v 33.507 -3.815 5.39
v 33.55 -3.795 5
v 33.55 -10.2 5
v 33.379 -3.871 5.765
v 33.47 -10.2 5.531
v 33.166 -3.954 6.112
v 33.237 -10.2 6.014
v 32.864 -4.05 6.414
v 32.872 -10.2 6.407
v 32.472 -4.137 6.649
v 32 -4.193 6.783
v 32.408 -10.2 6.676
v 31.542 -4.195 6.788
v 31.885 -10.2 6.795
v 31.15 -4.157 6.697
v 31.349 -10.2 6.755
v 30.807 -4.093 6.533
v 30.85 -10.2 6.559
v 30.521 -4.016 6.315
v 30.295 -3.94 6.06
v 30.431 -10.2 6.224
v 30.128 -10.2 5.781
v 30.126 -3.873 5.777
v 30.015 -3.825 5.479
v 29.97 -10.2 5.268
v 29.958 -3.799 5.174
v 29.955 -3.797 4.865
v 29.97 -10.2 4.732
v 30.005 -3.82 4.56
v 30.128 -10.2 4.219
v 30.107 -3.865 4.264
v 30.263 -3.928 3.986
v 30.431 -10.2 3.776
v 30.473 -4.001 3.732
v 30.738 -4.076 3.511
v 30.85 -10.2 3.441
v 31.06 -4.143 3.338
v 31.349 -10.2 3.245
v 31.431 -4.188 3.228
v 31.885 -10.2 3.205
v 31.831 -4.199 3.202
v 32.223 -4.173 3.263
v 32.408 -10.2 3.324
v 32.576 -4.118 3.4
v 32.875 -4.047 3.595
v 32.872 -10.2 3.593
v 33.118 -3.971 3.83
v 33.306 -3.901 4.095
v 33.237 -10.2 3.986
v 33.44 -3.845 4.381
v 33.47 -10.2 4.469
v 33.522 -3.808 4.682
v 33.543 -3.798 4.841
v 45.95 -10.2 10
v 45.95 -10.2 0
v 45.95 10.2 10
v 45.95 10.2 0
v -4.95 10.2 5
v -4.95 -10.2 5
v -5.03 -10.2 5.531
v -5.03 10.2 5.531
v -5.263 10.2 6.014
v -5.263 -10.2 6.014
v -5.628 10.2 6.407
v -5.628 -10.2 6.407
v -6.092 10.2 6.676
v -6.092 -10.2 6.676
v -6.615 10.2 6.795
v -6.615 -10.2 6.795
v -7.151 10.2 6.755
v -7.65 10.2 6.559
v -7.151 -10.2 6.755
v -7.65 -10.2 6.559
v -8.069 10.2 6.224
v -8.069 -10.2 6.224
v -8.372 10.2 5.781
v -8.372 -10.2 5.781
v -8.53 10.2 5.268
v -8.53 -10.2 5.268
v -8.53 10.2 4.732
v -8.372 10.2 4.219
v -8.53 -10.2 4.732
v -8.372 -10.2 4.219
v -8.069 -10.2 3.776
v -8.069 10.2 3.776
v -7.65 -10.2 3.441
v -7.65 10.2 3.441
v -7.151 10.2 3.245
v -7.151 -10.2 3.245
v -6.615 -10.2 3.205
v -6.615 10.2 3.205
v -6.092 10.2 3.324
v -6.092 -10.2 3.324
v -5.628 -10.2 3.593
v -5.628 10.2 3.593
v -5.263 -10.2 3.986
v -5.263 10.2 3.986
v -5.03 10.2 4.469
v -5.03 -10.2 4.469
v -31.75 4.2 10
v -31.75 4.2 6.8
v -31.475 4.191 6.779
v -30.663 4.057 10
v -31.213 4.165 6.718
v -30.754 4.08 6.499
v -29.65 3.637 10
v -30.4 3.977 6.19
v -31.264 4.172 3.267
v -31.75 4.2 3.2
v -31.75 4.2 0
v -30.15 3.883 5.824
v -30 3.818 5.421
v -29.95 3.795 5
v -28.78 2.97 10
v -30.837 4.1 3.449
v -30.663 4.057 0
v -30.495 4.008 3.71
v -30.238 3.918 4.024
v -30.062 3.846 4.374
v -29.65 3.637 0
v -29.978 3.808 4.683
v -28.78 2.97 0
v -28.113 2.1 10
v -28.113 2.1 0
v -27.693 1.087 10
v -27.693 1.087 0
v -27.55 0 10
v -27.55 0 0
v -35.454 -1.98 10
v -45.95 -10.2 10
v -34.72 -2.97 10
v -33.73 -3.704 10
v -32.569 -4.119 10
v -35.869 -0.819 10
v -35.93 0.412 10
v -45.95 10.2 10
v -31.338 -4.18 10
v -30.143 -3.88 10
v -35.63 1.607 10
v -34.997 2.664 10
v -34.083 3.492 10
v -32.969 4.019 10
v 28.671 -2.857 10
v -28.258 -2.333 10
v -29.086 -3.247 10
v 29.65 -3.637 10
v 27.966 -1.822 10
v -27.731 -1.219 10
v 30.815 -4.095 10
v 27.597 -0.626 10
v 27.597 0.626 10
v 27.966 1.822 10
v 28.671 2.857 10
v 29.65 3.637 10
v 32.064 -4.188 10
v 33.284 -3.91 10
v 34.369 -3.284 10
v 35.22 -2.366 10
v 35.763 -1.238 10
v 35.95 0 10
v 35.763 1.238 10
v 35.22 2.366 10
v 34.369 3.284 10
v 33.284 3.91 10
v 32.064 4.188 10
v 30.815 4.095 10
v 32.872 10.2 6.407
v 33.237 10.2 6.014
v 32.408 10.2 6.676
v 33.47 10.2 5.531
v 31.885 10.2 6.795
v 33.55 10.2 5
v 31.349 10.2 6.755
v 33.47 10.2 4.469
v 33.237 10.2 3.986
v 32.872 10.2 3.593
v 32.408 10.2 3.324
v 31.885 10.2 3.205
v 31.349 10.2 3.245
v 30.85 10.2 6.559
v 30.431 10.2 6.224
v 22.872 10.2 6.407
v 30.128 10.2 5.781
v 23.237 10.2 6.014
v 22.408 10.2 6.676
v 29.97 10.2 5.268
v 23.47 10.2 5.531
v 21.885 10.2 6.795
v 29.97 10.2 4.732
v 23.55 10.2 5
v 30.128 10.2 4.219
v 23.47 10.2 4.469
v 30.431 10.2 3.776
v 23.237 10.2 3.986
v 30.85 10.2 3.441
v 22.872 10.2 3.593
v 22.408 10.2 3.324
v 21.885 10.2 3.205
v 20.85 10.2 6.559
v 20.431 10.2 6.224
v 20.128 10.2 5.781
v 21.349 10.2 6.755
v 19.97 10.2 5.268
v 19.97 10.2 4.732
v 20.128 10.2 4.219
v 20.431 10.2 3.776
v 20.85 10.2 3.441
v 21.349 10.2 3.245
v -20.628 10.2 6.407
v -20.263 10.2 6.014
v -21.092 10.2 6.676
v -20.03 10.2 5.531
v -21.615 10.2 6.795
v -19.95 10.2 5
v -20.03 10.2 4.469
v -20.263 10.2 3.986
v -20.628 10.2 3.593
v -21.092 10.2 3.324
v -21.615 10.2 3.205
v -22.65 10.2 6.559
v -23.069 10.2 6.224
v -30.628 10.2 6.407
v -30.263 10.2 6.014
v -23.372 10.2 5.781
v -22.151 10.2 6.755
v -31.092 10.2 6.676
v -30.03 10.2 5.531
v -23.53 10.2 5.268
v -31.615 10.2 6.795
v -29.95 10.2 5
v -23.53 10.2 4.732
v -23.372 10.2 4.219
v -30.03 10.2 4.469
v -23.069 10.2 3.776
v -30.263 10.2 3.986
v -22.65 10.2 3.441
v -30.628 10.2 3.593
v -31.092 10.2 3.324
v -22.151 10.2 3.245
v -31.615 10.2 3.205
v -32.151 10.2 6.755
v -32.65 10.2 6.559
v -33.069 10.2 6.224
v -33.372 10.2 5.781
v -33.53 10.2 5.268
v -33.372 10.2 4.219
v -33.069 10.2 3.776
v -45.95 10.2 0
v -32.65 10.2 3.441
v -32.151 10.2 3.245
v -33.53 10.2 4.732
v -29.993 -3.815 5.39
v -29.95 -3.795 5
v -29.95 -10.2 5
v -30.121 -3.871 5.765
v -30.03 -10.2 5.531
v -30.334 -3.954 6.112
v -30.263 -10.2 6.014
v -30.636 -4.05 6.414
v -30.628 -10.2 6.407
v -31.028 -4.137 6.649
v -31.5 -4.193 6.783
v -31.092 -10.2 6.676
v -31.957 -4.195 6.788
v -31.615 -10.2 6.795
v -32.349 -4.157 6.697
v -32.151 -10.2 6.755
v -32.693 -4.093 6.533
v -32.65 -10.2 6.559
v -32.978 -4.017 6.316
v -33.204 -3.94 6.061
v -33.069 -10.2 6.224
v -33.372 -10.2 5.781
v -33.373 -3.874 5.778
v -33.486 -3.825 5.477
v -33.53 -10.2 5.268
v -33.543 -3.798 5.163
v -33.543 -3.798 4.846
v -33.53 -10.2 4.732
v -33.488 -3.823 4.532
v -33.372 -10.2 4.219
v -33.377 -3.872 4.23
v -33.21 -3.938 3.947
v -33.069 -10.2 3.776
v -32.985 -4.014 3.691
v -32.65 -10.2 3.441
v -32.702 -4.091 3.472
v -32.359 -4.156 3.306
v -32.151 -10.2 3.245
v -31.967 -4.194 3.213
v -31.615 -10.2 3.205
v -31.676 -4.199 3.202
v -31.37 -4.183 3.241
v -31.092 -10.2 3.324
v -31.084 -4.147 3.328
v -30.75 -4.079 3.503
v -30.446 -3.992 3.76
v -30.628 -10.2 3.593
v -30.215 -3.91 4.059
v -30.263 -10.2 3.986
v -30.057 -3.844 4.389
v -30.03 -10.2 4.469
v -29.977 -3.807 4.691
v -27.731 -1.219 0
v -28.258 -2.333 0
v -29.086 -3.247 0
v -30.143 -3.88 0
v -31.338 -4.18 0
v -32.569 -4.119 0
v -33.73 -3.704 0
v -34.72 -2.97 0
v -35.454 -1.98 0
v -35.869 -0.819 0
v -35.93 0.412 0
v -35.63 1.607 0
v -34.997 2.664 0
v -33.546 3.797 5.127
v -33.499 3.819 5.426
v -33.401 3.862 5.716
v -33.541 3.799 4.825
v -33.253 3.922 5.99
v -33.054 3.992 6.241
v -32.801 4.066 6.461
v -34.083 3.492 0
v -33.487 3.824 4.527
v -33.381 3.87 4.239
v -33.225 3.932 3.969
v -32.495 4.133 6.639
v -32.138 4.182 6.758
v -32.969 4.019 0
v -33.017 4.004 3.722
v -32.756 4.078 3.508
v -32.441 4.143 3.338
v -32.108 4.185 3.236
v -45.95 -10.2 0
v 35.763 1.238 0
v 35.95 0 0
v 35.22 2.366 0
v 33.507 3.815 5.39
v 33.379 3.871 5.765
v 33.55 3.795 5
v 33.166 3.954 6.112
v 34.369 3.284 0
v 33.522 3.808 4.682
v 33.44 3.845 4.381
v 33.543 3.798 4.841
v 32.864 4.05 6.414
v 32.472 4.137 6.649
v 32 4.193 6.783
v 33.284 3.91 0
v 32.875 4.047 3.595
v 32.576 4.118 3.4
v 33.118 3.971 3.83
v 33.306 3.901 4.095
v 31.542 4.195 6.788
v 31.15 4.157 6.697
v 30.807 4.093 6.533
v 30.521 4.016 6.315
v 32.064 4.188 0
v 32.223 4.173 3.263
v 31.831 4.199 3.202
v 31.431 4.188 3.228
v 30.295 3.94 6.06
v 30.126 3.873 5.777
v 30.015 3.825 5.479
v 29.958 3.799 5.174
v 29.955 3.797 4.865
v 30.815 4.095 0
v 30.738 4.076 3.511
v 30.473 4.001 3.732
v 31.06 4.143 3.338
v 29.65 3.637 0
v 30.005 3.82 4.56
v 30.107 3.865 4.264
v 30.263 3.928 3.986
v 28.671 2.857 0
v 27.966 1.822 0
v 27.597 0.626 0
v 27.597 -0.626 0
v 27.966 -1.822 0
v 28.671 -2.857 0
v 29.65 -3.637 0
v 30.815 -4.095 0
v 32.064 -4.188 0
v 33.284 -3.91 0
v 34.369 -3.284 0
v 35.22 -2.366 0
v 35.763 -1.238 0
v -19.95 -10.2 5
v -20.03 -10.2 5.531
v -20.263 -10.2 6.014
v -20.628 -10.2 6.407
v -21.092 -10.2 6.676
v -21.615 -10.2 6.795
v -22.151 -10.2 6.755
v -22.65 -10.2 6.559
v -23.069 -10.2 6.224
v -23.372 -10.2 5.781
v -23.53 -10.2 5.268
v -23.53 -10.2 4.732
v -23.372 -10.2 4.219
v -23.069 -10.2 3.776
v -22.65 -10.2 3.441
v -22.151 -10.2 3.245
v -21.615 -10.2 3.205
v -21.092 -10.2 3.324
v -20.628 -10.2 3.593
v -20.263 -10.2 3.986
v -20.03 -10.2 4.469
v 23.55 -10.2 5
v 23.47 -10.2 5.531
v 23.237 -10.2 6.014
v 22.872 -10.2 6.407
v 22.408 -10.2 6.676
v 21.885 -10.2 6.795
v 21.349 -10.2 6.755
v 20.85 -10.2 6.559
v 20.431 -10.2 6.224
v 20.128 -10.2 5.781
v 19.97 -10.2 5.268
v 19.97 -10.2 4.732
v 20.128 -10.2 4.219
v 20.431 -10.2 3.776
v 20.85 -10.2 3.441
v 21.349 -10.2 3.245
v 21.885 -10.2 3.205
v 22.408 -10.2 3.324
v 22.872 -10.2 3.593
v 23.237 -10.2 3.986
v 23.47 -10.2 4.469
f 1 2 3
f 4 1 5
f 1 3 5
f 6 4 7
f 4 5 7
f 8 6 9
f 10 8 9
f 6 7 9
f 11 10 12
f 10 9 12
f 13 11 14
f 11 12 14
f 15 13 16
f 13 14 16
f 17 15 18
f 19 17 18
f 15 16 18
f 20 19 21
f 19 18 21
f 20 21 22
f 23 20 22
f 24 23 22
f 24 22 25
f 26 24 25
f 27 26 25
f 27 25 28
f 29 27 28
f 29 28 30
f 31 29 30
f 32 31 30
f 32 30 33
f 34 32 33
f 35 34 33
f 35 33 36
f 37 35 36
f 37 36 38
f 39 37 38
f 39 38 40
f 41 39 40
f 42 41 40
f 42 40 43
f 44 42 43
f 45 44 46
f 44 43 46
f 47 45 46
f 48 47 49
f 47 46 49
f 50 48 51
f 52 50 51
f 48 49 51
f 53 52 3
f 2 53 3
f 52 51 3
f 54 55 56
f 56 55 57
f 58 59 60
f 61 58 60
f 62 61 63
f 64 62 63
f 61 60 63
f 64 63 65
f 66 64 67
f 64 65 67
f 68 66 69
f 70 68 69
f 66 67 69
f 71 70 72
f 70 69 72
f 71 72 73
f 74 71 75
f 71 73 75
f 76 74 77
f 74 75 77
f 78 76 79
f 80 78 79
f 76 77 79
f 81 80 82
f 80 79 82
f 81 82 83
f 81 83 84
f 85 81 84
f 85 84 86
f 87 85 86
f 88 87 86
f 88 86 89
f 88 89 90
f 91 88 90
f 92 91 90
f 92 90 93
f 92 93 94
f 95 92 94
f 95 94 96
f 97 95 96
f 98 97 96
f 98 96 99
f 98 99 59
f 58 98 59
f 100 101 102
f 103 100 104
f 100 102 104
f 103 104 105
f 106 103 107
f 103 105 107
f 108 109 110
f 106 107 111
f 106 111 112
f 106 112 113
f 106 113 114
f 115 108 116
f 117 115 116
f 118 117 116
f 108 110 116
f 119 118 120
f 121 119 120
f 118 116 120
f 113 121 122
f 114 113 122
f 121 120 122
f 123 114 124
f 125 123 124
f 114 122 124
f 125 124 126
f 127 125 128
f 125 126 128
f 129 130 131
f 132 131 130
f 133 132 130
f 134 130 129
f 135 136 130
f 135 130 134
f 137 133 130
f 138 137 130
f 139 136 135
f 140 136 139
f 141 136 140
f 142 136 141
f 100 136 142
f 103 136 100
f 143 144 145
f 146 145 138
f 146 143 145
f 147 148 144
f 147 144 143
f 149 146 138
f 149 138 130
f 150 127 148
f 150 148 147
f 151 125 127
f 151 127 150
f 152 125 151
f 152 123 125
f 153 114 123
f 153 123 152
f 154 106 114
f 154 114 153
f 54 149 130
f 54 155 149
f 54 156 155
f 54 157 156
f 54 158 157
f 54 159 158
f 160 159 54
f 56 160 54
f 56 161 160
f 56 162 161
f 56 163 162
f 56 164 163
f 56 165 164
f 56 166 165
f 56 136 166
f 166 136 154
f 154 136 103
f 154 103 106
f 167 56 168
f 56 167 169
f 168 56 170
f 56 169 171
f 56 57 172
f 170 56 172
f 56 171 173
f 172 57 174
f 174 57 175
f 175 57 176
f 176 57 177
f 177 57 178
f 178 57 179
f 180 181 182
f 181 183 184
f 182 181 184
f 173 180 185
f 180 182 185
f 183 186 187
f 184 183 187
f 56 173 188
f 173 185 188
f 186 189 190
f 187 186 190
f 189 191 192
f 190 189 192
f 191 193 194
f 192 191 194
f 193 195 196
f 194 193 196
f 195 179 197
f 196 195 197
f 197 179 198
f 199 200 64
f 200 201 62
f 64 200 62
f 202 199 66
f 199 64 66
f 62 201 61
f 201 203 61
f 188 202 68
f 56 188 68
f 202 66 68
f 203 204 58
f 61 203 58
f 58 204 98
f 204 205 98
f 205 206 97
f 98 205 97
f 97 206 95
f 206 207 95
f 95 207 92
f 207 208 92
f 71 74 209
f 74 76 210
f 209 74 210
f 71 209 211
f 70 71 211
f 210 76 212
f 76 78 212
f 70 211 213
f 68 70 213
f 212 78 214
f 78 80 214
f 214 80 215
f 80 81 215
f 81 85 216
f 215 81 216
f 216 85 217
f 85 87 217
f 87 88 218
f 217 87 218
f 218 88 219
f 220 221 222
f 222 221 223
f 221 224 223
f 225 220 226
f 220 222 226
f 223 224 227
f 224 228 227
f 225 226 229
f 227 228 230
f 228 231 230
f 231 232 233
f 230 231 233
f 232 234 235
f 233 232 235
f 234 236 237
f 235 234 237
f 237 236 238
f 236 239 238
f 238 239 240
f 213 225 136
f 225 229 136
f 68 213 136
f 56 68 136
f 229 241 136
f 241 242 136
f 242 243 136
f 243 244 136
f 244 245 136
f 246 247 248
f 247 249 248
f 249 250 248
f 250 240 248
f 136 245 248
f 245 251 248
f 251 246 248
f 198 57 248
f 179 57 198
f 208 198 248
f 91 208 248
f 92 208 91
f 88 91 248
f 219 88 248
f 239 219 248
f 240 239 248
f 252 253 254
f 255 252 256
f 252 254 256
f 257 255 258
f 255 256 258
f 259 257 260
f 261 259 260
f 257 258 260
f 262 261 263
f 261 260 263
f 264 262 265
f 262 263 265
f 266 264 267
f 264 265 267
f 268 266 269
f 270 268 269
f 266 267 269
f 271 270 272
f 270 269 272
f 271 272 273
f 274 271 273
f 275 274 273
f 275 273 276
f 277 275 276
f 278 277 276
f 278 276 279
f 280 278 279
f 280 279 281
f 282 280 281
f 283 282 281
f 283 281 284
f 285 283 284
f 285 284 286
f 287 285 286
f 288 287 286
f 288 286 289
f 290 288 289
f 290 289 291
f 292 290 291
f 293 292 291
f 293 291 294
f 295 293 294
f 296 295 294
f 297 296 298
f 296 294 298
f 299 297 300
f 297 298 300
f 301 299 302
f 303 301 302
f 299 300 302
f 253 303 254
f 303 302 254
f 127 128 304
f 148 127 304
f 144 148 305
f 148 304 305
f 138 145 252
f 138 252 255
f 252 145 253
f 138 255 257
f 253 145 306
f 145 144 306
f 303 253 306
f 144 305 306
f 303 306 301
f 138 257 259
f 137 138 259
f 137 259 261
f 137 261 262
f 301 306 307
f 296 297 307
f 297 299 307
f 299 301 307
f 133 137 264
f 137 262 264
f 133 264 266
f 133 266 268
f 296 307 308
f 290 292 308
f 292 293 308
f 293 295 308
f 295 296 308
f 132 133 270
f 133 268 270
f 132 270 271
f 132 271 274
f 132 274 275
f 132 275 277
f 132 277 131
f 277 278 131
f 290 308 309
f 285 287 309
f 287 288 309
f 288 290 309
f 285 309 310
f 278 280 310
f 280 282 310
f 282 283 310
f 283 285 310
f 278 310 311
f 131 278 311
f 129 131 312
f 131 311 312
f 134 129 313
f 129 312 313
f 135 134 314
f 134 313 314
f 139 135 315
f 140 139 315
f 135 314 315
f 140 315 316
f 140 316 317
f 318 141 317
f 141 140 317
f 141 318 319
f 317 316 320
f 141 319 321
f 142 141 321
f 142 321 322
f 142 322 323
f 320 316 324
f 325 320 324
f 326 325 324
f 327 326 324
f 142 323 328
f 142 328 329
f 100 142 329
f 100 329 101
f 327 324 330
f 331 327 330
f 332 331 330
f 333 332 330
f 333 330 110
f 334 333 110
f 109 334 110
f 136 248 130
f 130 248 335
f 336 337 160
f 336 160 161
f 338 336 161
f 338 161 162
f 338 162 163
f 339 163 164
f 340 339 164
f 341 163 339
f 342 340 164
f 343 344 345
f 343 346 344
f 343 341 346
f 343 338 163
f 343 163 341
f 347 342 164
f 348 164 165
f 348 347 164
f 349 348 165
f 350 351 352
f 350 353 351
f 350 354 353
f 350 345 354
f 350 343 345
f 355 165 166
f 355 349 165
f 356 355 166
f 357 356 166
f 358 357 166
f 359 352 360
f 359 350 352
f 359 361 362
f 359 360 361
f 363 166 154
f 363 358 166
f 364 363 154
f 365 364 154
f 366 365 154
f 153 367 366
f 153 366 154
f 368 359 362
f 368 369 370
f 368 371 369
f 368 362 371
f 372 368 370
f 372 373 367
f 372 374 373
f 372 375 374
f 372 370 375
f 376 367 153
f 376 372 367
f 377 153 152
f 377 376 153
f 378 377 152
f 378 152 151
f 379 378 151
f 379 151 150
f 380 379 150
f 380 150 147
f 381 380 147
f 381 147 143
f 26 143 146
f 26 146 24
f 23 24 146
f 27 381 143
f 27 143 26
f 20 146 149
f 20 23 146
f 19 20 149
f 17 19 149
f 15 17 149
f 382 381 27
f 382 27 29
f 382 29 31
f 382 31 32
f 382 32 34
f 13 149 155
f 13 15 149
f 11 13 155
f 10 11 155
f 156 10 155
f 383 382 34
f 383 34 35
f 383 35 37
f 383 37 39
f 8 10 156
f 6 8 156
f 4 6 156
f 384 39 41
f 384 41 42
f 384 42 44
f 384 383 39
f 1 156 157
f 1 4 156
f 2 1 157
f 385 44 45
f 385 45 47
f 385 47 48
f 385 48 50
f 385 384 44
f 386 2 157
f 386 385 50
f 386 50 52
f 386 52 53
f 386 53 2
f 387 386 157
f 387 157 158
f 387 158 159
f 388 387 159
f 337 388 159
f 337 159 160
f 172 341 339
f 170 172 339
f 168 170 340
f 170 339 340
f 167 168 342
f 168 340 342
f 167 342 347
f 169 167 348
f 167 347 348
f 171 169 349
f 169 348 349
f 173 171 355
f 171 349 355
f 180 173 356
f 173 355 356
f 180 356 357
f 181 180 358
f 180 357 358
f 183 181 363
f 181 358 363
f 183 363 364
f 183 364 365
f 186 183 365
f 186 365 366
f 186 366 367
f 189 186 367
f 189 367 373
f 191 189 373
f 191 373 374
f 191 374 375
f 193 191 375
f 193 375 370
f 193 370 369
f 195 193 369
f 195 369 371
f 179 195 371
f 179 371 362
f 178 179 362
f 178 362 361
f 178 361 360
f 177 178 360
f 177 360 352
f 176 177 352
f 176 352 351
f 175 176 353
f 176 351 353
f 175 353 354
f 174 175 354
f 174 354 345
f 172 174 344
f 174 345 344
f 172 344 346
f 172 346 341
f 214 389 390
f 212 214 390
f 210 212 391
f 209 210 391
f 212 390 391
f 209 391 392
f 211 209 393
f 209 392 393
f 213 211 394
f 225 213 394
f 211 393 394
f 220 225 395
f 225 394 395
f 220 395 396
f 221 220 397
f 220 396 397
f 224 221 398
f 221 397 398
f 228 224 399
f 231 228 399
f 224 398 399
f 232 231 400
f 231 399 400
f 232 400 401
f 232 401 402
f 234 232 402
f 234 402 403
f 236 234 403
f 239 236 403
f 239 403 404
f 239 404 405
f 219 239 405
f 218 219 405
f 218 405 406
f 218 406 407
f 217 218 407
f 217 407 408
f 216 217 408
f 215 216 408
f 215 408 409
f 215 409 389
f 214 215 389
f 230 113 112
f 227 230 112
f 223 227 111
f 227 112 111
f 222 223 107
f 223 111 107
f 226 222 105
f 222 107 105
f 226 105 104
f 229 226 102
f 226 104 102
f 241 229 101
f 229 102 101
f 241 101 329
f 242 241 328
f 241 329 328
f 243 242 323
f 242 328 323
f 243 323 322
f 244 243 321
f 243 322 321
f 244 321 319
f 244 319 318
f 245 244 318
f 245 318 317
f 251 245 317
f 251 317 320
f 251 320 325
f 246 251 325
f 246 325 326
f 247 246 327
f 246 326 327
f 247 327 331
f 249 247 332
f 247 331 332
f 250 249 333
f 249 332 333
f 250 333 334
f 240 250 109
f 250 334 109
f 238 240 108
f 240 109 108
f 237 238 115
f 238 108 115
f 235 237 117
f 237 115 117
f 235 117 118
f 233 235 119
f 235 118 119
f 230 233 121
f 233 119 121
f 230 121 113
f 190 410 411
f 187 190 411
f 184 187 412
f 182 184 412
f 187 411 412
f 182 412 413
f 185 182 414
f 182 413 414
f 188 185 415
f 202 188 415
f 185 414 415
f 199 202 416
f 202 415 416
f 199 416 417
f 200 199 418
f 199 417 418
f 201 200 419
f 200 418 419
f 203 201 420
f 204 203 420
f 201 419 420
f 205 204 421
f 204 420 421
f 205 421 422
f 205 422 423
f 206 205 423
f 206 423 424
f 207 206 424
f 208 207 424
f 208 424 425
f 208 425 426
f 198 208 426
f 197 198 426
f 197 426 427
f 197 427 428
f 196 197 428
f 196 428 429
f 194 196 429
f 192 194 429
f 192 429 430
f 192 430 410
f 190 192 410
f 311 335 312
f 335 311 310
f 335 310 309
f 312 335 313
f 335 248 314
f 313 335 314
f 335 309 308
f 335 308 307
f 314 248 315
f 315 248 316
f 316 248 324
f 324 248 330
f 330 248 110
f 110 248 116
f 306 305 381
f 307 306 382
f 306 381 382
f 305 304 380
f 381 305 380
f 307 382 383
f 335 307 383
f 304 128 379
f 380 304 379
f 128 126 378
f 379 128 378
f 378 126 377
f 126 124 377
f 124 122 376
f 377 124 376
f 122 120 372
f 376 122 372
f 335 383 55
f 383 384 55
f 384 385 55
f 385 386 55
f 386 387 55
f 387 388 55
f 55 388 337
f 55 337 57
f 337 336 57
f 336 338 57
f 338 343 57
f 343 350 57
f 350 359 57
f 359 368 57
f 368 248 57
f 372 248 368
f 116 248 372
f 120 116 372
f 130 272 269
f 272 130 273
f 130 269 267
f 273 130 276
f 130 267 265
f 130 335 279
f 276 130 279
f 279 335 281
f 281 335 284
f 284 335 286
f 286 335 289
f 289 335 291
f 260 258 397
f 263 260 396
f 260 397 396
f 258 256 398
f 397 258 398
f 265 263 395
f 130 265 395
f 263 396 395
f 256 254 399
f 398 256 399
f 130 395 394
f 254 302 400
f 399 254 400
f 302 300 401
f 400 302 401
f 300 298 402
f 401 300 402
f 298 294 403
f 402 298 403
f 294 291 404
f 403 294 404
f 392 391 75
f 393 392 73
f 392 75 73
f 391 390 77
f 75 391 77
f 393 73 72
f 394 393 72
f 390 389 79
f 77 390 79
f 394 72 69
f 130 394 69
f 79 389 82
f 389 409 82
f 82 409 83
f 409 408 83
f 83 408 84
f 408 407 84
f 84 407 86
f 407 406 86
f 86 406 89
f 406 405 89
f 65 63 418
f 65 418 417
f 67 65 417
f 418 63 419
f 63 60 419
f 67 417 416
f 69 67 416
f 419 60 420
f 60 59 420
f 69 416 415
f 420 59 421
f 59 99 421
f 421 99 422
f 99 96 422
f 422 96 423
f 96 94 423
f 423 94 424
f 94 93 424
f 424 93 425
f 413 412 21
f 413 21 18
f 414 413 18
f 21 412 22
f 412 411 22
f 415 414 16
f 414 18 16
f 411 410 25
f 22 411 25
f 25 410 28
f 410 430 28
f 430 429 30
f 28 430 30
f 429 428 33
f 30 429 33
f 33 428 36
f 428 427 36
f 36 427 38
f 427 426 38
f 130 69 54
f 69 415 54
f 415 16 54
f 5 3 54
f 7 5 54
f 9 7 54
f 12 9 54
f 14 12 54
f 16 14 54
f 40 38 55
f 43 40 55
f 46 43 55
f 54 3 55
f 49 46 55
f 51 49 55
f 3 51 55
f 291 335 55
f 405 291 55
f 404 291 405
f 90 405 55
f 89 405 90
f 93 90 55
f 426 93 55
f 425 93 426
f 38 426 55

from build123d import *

# Parameters (mm, degrees)
F0_R     = 4.2
F1_DEPTH = 10
F3_D     = 3.6


with BuildPart() as f1:
    # F0 (on Top) → F1 (new body)
    with BuildSketch(Plane.XY):
        Polygon((-31.75, 10.2), (-45.95, 10.2), (-45.95, -10.2), (45.95, -10.2), (45.95, 10.2), align=None)
        with BuildLine():
            ThreePointArc((-27.55, 0), (-34.719848, -2.969848), (-31.75, 4.2))
            ThreePointArc((-31.75, 4.2), (-28.780152, 2.969848), (-27.55, 0))
        make_face(mode=Mode.SUBTRACT)
        with Locations((31.75, 0)):
            Circle(F0_R, mode=Mode.SUBTRACT)
    extrude(amount=F1_DEPTH)

    # F3 (through all)
    with Locations(Plane(origin=(0, 10.2, 0), x_dir=(-1, 0, 0), z_dir=(0, 1, 0))):
        with Locations((-31.75, 5), (-21.75, 5), (21.75, 5), (31.75, 5), (6.75, 5)):
            Hole(F3_D / 2)


solid = f1.part
